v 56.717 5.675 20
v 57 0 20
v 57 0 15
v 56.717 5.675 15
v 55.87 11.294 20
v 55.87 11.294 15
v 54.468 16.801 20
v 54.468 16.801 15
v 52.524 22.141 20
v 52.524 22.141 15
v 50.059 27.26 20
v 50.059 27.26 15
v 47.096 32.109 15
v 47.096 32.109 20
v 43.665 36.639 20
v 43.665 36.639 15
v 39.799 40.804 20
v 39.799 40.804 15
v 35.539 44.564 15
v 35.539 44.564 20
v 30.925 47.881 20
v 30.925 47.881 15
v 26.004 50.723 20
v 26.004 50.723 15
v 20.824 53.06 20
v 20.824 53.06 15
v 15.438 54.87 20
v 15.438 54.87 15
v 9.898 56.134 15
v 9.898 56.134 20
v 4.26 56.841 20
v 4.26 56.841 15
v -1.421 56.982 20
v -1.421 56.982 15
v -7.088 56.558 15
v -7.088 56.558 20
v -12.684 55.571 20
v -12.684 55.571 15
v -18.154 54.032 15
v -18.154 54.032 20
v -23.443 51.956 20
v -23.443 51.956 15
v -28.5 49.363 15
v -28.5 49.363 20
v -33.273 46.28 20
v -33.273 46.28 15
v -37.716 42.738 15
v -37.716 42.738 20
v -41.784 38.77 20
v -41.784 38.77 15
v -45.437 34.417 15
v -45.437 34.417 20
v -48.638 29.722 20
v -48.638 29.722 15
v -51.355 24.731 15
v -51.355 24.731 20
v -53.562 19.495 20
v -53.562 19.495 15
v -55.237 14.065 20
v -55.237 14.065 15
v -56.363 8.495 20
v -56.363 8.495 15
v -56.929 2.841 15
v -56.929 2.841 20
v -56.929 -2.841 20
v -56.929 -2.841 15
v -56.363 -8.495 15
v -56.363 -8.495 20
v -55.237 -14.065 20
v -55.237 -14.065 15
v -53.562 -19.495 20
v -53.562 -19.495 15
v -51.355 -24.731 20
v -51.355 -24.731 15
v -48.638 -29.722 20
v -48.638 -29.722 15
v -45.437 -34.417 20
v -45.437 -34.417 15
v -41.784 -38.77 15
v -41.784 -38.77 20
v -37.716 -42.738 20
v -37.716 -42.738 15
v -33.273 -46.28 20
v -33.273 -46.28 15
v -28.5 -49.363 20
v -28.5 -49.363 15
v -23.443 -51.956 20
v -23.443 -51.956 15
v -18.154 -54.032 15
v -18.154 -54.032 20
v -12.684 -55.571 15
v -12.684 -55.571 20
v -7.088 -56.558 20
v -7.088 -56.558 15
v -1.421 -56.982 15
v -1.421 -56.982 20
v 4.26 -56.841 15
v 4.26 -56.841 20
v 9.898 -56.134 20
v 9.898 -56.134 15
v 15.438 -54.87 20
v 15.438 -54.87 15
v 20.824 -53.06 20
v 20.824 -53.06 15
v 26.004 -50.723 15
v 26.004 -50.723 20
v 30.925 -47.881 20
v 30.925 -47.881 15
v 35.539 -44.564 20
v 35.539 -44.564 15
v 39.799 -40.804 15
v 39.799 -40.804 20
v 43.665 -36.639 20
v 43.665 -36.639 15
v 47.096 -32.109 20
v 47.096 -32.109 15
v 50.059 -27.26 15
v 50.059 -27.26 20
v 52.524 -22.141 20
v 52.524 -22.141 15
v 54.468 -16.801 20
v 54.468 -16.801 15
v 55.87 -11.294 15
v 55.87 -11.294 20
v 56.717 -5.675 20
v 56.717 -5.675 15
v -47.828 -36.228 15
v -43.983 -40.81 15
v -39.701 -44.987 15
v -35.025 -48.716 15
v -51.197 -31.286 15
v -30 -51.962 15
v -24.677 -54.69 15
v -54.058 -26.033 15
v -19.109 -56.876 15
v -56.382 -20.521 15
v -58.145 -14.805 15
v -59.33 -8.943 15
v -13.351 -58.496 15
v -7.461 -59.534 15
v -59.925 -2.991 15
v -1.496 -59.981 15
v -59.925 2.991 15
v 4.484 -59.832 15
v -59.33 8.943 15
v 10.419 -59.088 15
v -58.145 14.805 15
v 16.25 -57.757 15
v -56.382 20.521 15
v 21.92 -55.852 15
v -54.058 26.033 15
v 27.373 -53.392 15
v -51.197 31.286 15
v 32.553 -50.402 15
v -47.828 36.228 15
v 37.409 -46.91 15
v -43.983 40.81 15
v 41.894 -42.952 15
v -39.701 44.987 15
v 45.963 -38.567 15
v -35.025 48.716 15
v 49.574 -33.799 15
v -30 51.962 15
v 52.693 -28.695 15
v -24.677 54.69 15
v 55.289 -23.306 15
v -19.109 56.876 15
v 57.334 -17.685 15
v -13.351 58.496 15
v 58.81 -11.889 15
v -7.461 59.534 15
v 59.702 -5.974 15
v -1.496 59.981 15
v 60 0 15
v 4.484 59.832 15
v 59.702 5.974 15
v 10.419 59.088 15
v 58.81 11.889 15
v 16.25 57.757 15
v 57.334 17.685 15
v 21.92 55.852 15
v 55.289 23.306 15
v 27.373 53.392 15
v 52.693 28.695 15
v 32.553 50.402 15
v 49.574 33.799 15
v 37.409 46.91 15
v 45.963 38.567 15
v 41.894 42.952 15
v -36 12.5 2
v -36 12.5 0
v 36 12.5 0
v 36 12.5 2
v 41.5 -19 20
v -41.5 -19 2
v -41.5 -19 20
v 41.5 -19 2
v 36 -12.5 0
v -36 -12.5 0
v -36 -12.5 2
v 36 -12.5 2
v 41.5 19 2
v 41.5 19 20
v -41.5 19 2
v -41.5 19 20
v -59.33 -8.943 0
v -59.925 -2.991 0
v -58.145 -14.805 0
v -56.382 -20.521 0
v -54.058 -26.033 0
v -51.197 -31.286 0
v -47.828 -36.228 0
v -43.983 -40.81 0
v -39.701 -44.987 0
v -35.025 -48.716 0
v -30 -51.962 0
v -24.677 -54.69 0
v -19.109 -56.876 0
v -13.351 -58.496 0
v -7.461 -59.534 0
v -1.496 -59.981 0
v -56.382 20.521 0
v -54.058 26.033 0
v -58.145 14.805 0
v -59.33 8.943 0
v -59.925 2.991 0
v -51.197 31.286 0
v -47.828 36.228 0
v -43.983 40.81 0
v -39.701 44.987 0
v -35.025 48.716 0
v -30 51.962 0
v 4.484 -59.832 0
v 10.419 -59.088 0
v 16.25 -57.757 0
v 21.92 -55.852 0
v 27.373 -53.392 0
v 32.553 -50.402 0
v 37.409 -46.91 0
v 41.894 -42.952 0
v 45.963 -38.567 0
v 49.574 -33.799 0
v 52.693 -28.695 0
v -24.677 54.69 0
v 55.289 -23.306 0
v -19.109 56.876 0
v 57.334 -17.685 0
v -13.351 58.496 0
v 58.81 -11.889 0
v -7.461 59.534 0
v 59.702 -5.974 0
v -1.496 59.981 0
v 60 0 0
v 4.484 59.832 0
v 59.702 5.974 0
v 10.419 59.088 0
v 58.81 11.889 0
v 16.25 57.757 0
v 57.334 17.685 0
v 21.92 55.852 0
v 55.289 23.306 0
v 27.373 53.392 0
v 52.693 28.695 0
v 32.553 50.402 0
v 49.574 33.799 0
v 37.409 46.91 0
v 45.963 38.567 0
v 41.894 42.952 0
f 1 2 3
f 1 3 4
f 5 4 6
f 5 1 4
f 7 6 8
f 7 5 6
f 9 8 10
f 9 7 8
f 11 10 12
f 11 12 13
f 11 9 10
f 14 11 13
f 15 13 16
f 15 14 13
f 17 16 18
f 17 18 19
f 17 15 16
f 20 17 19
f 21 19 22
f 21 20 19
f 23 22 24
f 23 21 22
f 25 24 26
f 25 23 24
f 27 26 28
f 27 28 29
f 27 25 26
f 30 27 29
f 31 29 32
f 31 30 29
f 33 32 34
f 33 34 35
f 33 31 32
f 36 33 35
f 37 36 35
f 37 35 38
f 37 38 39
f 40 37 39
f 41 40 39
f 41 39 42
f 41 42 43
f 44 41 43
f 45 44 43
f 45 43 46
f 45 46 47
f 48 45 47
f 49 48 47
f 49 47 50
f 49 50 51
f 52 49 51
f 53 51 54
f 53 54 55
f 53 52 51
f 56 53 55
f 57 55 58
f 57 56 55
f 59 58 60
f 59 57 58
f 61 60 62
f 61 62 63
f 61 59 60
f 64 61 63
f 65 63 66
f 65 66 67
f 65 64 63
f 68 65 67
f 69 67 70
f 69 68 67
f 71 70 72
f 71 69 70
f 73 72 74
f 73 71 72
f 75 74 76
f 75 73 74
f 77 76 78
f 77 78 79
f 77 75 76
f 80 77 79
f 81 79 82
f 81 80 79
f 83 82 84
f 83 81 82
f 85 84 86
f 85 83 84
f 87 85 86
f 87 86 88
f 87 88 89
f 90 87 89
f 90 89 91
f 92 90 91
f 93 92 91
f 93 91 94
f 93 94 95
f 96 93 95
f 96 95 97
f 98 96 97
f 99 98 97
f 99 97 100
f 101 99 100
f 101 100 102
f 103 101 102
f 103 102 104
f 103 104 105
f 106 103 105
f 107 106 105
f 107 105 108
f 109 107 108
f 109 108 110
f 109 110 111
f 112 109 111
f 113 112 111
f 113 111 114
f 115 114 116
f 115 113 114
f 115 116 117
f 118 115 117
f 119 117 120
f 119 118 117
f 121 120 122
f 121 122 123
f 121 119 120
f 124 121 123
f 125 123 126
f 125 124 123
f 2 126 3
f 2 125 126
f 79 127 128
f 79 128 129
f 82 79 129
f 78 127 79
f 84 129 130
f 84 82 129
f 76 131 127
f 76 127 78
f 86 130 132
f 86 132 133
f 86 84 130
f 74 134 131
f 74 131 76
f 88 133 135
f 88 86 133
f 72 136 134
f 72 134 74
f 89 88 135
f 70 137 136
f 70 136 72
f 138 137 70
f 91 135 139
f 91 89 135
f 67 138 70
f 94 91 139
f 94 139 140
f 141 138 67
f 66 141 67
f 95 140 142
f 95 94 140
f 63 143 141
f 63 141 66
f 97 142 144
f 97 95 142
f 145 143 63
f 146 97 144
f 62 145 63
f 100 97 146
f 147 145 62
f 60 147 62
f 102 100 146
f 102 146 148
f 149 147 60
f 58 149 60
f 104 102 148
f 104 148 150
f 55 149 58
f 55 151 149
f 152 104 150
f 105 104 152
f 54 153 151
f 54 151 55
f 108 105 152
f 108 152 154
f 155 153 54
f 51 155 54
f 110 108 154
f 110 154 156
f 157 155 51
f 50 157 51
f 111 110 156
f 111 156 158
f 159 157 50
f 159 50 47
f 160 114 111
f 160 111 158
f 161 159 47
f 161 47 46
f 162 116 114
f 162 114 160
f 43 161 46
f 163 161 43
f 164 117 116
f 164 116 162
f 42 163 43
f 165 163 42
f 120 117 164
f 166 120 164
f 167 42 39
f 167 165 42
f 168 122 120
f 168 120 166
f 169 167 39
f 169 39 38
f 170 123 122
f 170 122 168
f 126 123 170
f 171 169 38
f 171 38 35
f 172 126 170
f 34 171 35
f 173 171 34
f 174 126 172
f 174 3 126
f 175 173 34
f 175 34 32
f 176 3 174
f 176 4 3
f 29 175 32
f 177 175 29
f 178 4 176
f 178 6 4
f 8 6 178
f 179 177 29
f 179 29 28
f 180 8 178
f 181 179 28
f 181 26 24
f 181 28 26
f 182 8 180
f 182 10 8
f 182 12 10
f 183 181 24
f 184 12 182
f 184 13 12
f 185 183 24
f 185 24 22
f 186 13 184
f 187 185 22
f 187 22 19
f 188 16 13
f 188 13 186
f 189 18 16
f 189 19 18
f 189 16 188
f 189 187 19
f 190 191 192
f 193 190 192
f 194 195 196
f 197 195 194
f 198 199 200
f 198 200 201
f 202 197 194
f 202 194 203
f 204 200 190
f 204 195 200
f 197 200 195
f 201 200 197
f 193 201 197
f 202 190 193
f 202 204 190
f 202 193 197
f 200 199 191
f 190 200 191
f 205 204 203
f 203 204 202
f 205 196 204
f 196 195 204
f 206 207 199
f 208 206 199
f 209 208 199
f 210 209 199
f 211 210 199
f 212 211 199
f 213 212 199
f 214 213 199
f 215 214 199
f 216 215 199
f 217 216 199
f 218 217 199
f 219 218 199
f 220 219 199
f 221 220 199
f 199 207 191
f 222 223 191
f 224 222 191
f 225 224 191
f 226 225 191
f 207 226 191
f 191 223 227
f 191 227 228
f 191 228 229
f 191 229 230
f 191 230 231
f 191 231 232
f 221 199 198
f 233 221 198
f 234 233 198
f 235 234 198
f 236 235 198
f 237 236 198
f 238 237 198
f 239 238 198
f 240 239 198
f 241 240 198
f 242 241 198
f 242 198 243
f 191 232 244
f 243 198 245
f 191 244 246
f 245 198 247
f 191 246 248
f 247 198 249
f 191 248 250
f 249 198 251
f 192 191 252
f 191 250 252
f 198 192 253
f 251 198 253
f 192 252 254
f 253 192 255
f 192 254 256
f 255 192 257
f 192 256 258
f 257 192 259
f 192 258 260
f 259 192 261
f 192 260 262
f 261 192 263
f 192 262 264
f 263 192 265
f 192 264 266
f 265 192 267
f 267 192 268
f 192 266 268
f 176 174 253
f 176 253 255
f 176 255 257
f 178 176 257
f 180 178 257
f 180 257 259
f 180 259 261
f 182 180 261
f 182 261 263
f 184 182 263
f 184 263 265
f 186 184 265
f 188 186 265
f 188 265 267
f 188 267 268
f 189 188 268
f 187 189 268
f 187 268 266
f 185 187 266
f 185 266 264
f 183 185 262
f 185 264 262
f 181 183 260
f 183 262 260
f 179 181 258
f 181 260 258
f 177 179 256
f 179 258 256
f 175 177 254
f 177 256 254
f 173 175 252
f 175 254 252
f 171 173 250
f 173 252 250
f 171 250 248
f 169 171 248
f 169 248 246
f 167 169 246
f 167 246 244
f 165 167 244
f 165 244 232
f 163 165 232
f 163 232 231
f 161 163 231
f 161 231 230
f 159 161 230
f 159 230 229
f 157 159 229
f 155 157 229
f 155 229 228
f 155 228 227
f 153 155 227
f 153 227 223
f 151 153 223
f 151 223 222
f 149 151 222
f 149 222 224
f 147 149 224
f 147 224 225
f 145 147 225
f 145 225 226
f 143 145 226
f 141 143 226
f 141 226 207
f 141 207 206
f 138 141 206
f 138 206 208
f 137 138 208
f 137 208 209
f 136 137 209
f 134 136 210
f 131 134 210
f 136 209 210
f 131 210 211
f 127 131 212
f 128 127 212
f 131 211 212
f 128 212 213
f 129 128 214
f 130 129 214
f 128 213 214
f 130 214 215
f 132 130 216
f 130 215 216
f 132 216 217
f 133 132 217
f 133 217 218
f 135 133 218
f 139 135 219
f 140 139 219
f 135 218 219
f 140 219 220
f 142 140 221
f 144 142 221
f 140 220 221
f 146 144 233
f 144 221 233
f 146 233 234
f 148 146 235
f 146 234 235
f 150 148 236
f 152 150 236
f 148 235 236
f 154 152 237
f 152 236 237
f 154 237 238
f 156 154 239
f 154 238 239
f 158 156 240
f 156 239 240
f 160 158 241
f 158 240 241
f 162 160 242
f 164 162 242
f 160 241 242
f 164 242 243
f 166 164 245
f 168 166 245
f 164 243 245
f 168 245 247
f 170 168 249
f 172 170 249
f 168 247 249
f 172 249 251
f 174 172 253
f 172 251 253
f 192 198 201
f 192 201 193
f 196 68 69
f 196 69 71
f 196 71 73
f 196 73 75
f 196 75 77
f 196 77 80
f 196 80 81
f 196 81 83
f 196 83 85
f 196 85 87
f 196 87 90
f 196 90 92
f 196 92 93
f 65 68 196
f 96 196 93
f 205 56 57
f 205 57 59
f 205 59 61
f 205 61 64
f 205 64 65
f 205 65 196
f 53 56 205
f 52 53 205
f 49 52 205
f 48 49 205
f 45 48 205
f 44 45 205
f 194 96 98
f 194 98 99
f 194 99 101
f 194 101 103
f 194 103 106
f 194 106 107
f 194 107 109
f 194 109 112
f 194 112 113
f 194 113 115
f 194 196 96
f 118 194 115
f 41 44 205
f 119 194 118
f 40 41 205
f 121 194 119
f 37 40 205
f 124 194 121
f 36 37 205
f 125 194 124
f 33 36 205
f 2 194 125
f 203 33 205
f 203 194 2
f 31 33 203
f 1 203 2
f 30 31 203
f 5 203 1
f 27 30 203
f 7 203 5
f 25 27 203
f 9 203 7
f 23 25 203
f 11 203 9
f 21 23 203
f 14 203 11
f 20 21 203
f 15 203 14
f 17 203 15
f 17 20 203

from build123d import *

# Parameters (mm, degrees)
F0_R           = 60
F0_R_2         = 57
F2_DEPTH       = 15
F1_R           = 57
F1_R_2         = 54
F3_DEPTH       = 20
F4_R           = 57
F5_DEPTH       = 10
F7_R           = 54
F8_DEPTH       = 40
F9_W           = 15
F9_H           = 10
F10_DEPTH      = 279.5
F11_DEPTH      = 71.5
F13_R          = 60
F14_DEPTH      = 20
F15_W          = 72
F15_H          = 25
F16_DEPTH      = 20
F17_W          = 83
F17_H          = 38
F18_DEPTH      = 13
F18_DEPTH_BACK = 5
F19_R          = 60
F19_R_2        = 57
F20_DEPTH      = 5


# Not quite as in the source:
# - a feature names something its author has since deleted; it is built from what else it names


with BuildPart() as f2:
    # F0 (on Top) → F2 (new body)
    with BuildSketch(Plane.XY):
        Circle(F0_R)
        Circle(F0_R_2, mode=Mode.SUBTRACT)
    extrude(amount=F2_DEPTH)

    # F1 (on Top) → F3 (join)
    with BuildSketch(Plane.XY):
        Circle(F1_R)
        Circle(F1_R_2, mode=Mode.SUBTRACT)
    extrude(amount=F3_DEPTH)

    # F4 (on Top) → F5 (join)
    with BuildSketch(Plane.XY):
        Circle(F4_R)
    extrude(amount=F5_DEPTH)

    # F7 (on offset) → F8 (cut)
    with BuildSketch(Plane.XY.offset(45)):
        Circle(F7_R)
    extrude(amount=-F8_DEPTH, mode=Mode.SUBTRACT)

    # F9 (on Right) → F10 (cut)
    with BuildSketch(Plane.YZ):
        with Locations((32.5, 60)):
            Rectangle(F9_W, F9_H)
    extrude(amount=F10_DEPTH, mode=Mode.SUBTRACT)

    # F1 (on Top) → F11 (cut)
    with BuildSketch(Plane.XY):
        Circle(F1_R_2)
    extrude(amount=F11_DEPTH, mode=Mode.SUBTRACT)

    # F13 (on Top) → F14 (join)
    with BuildSketch(Plane.XY):
        Circle(F13_R)
    extrude(amount=F14_DEPTH)

    # F15 (on Top) → F16 (cut)
    with BuildSketch(Plane.XY):
        Rectangle(F15_W, F15_H)
    extrude(amount=F16_DEPTH, mode=Mode.SUBTRACT)

    # F17 (on offset) → F18 (cut, two sides)
    with BuildSketch(Plane.XY.offset(15)) as f18_sk:
        Rectangle(F17_W, F17_H)
    extrude(amount=-F18_DEPTH, mode=Mode.SUBTRACT)
    extrude(f18_sk.sketch, amount=F18_DEPTH_BACK, mode=Mode.SUBTRACT)

    # F19 (on face) → F20 (cut)
    with BuildSketch(Plane.XY.offset(20)):
        Circle(F19_R)
        Circle(F19_R_2, mode=Mode.SUBTRACT)
    extrude(amount=-F20_DEPTH, mode=Mode.SUBTRACT)


solid = f2.part
